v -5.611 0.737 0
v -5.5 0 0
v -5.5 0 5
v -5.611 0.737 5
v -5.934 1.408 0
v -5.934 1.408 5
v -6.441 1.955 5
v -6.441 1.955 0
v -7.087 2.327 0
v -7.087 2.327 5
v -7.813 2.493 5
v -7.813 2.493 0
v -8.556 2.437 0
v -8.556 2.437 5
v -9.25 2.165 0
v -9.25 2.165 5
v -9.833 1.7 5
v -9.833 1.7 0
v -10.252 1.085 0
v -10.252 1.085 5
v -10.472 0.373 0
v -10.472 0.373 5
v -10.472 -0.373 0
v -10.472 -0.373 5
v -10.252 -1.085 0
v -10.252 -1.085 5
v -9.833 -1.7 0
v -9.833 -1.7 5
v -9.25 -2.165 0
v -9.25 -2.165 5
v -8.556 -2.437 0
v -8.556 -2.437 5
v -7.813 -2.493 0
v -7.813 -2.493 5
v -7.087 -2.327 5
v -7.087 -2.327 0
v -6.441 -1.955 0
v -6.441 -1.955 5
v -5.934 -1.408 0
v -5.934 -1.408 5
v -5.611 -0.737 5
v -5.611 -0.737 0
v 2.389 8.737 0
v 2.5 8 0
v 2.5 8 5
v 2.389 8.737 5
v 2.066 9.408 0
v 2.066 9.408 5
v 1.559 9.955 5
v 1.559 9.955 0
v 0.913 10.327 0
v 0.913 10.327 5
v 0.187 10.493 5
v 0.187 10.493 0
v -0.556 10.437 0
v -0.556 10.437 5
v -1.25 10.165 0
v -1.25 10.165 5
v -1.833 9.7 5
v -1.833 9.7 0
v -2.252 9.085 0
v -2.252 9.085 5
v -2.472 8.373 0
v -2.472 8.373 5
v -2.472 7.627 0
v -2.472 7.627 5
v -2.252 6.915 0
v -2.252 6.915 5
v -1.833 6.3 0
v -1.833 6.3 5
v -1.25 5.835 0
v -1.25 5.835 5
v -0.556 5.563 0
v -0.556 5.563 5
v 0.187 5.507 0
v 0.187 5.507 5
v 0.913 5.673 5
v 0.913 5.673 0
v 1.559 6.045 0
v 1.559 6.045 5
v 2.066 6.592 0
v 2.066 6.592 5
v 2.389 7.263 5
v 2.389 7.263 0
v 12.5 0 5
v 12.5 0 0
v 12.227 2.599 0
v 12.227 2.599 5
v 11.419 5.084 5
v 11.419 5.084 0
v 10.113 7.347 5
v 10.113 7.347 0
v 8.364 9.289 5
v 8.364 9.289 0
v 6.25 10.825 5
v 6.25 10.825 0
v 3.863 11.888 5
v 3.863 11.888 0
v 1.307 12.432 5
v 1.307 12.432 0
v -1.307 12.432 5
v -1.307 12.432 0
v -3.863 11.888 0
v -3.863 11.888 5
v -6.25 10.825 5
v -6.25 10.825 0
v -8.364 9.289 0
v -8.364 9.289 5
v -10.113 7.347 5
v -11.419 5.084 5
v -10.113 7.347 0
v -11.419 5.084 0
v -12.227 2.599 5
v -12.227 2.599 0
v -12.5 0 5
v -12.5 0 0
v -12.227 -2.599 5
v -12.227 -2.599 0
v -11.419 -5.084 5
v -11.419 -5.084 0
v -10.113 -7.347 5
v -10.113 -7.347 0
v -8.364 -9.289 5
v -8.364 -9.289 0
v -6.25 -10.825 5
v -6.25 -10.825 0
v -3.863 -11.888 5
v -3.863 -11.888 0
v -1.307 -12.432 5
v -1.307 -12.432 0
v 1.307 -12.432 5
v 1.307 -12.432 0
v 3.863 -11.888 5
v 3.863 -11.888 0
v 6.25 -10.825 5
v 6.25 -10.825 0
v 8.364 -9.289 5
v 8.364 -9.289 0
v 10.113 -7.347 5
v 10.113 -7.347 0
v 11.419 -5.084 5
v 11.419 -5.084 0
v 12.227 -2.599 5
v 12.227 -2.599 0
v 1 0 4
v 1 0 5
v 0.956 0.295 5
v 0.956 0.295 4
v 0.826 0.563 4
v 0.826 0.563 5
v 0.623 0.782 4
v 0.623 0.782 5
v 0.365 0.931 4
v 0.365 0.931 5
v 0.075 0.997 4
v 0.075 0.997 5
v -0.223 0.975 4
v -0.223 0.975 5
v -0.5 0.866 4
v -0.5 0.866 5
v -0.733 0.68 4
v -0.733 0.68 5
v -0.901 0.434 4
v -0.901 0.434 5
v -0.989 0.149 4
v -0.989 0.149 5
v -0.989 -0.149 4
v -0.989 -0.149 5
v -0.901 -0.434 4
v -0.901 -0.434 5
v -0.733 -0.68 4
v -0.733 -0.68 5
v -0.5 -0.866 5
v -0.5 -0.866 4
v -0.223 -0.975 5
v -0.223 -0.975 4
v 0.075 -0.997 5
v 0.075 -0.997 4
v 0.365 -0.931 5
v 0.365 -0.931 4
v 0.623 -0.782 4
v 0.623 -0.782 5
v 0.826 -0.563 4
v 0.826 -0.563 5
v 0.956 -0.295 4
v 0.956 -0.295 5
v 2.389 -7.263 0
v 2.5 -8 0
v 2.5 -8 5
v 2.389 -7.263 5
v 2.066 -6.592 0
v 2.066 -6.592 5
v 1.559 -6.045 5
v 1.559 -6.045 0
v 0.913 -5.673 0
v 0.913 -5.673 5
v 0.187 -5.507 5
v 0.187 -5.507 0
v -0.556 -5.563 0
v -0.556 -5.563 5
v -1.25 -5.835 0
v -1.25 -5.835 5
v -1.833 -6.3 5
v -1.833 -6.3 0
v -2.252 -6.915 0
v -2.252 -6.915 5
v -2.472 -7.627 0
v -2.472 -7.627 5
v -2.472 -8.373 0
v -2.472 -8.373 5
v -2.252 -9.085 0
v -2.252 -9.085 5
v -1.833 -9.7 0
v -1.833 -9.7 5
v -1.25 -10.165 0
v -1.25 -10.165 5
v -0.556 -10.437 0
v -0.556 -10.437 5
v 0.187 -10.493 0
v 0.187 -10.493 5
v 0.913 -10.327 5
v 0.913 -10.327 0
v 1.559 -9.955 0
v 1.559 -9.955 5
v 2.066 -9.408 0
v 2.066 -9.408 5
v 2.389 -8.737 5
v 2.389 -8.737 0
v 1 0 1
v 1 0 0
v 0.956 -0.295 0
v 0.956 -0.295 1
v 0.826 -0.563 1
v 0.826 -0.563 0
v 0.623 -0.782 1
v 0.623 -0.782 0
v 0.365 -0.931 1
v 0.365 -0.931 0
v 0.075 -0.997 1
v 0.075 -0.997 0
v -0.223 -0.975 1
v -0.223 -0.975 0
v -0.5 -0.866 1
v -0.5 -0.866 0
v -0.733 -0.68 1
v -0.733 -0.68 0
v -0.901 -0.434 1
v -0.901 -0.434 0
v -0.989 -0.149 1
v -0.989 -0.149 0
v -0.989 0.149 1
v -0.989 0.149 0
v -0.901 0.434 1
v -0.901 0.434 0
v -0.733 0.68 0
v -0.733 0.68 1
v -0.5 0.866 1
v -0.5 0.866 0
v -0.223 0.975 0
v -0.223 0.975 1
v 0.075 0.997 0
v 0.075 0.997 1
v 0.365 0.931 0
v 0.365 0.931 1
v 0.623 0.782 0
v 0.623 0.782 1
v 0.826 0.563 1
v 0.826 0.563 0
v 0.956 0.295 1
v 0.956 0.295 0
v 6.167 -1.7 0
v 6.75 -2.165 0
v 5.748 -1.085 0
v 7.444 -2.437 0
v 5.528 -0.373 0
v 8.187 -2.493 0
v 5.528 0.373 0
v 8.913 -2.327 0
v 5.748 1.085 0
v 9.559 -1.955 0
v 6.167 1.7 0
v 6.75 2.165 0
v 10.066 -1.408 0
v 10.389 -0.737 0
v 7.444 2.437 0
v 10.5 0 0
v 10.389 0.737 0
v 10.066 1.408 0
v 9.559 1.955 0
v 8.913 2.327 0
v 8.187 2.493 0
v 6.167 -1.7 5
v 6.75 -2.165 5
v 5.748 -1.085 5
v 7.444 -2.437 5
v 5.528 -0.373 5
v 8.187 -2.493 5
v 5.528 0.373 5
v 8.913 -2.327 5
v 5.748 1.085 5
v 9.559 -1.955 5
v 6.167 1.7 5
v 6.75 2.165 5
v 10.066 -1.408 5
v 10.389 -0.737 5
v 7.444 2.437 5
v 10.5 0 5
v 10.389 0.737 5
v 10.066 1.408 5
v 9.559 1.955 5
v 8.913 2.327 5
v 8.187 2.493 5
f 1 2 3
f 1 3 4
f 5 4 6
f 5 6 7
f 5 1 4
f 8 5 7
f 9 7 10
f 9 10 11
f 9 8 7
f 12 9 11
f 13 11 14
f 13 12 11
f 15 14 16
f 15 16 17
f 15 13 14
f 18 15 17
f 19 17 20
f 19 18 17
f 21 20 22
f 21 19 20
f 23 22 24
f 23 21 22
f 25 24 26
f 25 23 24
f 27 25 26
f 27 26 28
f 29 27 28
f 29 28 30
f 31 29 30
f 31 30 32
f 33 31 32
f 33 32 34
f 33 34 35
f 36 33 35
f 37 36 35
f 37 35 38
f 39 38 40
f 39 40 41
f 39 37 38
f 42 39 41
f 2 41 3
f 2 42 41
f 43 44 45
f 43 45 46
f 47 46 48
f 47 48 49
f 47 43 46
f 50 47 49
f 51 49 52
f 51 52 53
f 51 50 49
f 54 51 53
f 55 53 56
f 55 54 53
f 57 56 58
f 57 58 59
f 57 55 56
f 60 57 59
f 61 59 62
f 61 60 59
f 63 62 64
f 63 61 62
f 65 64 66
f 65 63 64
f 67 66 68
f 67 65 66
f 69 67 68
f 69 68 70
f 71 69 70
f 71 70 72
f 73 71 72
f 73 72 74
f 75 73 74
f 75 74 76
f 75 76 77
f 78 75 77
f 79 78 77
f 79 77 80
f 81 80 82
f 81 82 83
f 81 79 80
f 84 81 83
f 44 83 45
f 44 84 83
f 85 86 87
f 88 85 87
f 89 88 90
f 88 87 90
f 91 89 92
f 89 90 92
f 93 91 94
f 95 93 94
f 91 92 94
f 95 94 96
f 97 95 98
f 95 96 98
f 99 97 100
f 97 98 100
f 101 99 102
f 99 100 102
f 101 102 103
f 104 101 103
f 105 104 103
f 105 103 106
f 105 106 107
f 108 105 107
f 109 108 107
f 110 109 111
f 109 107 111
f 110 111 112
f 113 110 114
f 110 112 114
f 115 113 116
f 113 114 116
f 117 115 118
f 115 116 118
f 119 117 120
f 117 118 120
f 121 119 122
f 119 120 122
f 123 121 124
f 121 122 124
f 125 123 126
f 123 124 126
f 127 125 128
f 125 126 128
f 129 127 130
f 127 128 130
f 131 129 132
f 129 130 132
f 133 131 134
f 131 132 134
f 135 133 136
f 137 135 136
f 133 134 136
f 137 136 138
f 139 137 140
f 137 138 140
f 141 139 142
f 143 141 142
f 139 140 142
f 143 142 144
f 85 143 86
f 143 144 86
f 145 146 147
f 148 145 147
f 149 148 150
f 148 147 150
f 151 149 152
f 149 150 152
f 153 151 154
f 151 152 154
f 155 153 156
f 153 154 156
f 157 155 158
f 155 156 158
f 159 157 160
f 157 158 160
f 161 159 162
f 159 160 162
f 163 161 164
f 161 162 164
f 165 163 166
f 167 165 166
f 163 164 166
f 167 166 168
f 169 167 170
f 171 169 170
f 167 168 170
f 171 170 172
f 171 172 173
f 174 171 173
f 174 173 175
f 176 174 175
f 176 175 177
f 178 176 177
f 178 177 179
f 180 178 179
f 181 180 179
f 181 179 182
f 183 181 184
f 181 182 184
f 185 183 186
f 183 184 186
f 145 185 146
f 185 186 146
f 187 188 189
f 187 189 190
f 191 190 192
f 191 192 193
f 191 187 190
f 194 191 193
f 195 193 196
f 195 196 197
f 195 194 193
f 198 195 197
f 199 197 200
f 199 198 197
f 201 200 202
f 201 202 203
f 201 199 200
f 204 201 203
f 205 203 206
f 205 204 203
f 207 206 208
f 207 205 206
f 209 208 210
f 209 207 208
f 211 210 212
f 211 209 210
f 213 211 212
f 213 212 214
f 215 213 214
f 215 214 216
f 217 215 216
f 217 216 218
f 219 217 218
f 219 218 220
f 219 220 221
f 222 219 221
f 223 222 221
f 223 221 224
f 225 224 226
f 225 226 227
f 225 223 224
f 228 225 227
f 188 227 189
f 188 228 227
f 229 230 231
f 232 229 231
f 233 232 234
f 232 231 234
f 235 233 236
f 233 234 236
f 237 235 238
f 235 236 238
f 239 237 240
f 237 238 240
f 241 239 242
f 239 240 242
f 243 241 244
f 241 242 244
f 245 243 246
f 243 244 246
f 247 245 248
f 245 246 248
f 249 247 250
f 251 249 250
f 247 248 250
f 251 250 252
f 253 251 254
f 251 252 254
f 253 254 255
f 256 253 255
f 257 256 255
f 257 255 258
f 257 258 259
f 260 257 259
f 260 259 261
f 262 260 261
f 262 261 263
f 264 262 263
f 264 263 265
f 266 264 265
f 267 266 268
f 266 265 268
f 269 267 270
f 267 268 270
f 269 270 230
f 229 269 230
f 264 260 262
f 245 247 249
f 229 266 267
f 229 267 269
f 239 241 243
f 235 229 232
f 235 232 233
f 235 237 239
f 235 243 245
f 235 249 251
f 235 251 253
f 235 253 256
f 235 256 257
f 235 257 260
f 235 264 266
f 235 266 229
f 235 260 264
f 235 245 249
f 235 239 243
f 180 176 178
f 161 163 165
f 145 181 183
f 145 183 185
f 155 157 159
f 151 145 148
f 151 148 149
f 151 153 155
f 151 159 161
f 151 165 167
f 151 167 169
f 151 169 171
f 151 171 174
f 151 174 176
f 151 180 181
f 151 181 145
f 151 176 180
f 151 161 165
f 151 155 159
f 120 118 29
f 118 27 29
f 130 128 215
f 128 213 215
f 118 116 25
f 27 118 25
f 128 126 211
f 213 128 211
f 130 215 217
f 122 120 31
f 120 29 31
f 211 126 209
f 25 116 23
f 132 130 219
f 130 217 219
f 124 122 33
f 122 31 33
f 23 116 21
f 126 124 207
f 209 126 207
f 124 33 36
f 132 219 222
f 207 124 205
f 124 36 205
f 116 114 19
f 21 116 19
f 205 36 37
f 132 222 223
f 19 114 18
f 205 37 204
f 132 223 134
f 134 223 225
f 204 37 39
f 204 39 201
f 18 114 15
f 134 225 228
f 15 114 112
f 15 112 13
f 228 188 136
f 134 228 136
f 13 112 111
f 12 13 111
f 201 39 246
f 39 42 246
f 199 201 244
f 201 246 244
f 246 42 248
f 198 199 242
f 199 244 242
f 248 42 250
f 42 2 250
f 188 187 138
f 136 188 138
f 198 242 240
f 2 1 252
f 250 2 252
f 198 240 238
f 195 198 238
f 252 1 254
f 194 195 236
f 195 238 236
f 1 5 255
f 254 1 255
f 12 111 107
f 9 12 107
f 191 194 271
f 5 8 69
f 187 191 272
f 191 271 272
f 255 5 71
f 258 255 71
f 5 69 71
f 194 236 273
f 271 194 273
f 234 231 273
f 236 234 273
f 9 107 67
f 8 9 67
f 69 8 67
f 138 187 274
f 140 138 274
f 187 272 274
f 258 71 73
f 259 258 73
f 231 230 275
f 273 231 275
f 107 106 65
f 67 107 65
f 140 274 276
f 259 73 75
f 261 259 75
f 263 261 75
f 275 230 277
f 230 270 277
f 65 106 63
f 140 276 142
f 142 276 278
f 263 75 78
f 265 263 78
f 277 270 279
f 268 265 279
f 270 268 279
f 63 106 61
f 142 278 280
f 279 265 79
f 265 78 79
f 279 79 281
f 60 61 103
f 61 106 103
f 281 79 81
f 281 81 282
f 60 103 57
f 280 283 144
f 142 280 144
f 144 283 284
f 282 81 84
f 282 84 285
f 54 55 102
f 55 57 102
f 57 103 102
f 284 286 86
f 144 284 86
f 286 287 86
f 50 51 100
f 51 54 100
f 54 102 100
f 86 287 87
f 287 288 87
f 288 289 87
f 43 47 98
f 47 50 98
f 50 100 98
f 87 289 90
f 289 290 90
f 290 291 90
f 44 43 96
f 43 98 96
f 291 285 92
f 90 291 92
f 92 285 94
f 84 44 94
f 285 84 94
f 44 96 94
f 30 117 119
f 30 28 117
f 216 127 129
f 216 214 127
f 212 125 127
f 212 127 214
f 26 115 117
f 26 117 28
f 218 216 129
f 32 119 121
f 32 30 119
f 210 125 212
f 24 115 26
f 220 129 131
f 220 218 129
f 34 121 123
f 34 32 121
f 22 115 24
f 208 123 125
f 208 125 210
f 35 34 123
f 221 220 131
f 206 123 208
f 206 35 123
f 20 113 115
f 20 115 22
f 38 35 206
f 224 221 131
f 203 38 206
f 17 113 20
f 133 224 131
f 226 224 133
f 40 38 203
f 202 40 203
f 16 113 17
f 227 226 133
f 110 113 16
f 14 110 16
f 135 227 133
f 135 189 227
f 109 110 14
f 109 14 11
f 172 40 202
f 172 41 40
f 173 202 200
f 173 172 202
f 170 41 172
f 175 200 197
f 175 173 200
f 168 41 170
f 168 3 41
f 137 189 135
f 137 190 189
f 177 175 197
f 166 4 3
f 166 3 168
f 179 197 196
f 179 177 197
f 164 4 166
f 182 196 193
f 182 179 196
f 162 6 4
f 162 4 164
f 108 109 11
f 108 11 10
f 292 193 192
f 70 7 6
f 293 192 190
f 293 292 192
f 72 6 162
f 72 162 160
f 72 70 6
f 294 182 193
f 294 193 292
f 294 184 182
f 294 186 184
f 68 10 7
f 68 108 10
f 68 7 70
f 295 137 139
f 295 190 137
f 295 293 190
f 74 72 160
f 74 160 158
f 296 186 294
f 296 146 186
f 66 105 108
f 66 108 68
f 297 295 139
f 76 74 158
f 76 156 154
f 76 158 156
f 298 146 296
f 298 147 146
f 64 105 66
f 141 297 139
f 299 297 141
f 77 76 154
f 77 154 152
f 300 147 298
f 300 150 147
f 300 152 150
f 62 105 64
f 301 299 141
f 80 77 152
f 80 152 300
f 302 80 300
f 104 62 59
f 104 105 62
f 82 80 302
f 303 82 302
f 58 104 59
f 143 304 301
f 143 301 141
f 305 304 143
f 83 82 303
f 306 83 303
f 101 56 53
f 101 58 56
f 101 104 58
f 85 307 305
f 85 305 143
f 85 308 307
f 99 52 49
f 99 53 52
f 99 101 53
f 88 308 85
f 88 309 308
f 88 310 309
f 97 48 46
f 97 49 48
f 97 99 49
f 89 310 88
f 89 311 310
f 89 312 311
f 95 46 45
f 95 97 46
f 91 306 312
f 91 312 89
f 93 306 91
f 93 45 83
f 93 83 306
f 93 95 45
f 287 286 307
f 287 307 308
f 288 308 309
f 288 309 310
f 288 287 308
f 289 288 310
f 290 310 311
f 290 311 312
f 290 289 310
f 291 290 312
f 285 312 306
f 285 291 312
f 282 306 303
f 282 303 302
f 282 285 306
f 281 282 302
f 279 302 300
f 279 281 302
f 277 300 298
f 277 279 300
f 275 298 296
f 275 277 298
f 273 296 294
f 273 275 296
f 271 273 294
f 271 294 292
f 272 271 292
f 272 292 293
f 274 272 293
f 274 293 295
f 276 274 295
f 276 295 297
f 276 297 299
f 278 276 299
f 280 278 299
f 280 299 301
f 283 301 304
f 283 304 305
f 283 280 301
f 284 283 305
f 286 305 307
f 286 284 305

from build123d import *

# Parameters (mm, degrees)
F0_R     = 12.5
F0_R_2   = 2.5
F1_DEPTH = 5
F2_R     = 1
F3_DEPTH = 1
F4_R     = 1
F5_DEPTH = 1


with BuildPart() as f1:
    # F0 (on Top) → F1 (new body)
    with BuildSketch(Plane.XY):
        Circle(F0_R)
        with Locations((0, -8)):
            Circle(F0_R_2, mode=Mode.SUBTRACT)
        with Locations((-8, 0)):
            Circle(F0_R_2, mode=Mode.SUBTRACT)
        with Locations((8, 0)):
            Circle(F0_R_2, mode=Mode.SUBTRACT)
        with Locations((0, 8)):
            Circle(F0_R_2, mode=Mode.SUBTRACT)
    extrude(amount=F1_DEPTH)

    # F2 (on face) → F3 (cut)
    with BuildSketch(Plane.XY.offset(5)):
        Circle(F2_R)
    extrude(amount=-F3_DEPTH, mode=Mode.SUBTRACT)

    # F4 (on face) → F5 (cut)
    with BuildSketch(Plane(origin=(0, 0, 0), x_dir=(1, 0, 0), z_dir=(0, 0, -1))):
        Circle(F4_R)
    extrude(amount=-F5_DEPTH, mode=Mode.SUBTRACT)


solid = f1.part
